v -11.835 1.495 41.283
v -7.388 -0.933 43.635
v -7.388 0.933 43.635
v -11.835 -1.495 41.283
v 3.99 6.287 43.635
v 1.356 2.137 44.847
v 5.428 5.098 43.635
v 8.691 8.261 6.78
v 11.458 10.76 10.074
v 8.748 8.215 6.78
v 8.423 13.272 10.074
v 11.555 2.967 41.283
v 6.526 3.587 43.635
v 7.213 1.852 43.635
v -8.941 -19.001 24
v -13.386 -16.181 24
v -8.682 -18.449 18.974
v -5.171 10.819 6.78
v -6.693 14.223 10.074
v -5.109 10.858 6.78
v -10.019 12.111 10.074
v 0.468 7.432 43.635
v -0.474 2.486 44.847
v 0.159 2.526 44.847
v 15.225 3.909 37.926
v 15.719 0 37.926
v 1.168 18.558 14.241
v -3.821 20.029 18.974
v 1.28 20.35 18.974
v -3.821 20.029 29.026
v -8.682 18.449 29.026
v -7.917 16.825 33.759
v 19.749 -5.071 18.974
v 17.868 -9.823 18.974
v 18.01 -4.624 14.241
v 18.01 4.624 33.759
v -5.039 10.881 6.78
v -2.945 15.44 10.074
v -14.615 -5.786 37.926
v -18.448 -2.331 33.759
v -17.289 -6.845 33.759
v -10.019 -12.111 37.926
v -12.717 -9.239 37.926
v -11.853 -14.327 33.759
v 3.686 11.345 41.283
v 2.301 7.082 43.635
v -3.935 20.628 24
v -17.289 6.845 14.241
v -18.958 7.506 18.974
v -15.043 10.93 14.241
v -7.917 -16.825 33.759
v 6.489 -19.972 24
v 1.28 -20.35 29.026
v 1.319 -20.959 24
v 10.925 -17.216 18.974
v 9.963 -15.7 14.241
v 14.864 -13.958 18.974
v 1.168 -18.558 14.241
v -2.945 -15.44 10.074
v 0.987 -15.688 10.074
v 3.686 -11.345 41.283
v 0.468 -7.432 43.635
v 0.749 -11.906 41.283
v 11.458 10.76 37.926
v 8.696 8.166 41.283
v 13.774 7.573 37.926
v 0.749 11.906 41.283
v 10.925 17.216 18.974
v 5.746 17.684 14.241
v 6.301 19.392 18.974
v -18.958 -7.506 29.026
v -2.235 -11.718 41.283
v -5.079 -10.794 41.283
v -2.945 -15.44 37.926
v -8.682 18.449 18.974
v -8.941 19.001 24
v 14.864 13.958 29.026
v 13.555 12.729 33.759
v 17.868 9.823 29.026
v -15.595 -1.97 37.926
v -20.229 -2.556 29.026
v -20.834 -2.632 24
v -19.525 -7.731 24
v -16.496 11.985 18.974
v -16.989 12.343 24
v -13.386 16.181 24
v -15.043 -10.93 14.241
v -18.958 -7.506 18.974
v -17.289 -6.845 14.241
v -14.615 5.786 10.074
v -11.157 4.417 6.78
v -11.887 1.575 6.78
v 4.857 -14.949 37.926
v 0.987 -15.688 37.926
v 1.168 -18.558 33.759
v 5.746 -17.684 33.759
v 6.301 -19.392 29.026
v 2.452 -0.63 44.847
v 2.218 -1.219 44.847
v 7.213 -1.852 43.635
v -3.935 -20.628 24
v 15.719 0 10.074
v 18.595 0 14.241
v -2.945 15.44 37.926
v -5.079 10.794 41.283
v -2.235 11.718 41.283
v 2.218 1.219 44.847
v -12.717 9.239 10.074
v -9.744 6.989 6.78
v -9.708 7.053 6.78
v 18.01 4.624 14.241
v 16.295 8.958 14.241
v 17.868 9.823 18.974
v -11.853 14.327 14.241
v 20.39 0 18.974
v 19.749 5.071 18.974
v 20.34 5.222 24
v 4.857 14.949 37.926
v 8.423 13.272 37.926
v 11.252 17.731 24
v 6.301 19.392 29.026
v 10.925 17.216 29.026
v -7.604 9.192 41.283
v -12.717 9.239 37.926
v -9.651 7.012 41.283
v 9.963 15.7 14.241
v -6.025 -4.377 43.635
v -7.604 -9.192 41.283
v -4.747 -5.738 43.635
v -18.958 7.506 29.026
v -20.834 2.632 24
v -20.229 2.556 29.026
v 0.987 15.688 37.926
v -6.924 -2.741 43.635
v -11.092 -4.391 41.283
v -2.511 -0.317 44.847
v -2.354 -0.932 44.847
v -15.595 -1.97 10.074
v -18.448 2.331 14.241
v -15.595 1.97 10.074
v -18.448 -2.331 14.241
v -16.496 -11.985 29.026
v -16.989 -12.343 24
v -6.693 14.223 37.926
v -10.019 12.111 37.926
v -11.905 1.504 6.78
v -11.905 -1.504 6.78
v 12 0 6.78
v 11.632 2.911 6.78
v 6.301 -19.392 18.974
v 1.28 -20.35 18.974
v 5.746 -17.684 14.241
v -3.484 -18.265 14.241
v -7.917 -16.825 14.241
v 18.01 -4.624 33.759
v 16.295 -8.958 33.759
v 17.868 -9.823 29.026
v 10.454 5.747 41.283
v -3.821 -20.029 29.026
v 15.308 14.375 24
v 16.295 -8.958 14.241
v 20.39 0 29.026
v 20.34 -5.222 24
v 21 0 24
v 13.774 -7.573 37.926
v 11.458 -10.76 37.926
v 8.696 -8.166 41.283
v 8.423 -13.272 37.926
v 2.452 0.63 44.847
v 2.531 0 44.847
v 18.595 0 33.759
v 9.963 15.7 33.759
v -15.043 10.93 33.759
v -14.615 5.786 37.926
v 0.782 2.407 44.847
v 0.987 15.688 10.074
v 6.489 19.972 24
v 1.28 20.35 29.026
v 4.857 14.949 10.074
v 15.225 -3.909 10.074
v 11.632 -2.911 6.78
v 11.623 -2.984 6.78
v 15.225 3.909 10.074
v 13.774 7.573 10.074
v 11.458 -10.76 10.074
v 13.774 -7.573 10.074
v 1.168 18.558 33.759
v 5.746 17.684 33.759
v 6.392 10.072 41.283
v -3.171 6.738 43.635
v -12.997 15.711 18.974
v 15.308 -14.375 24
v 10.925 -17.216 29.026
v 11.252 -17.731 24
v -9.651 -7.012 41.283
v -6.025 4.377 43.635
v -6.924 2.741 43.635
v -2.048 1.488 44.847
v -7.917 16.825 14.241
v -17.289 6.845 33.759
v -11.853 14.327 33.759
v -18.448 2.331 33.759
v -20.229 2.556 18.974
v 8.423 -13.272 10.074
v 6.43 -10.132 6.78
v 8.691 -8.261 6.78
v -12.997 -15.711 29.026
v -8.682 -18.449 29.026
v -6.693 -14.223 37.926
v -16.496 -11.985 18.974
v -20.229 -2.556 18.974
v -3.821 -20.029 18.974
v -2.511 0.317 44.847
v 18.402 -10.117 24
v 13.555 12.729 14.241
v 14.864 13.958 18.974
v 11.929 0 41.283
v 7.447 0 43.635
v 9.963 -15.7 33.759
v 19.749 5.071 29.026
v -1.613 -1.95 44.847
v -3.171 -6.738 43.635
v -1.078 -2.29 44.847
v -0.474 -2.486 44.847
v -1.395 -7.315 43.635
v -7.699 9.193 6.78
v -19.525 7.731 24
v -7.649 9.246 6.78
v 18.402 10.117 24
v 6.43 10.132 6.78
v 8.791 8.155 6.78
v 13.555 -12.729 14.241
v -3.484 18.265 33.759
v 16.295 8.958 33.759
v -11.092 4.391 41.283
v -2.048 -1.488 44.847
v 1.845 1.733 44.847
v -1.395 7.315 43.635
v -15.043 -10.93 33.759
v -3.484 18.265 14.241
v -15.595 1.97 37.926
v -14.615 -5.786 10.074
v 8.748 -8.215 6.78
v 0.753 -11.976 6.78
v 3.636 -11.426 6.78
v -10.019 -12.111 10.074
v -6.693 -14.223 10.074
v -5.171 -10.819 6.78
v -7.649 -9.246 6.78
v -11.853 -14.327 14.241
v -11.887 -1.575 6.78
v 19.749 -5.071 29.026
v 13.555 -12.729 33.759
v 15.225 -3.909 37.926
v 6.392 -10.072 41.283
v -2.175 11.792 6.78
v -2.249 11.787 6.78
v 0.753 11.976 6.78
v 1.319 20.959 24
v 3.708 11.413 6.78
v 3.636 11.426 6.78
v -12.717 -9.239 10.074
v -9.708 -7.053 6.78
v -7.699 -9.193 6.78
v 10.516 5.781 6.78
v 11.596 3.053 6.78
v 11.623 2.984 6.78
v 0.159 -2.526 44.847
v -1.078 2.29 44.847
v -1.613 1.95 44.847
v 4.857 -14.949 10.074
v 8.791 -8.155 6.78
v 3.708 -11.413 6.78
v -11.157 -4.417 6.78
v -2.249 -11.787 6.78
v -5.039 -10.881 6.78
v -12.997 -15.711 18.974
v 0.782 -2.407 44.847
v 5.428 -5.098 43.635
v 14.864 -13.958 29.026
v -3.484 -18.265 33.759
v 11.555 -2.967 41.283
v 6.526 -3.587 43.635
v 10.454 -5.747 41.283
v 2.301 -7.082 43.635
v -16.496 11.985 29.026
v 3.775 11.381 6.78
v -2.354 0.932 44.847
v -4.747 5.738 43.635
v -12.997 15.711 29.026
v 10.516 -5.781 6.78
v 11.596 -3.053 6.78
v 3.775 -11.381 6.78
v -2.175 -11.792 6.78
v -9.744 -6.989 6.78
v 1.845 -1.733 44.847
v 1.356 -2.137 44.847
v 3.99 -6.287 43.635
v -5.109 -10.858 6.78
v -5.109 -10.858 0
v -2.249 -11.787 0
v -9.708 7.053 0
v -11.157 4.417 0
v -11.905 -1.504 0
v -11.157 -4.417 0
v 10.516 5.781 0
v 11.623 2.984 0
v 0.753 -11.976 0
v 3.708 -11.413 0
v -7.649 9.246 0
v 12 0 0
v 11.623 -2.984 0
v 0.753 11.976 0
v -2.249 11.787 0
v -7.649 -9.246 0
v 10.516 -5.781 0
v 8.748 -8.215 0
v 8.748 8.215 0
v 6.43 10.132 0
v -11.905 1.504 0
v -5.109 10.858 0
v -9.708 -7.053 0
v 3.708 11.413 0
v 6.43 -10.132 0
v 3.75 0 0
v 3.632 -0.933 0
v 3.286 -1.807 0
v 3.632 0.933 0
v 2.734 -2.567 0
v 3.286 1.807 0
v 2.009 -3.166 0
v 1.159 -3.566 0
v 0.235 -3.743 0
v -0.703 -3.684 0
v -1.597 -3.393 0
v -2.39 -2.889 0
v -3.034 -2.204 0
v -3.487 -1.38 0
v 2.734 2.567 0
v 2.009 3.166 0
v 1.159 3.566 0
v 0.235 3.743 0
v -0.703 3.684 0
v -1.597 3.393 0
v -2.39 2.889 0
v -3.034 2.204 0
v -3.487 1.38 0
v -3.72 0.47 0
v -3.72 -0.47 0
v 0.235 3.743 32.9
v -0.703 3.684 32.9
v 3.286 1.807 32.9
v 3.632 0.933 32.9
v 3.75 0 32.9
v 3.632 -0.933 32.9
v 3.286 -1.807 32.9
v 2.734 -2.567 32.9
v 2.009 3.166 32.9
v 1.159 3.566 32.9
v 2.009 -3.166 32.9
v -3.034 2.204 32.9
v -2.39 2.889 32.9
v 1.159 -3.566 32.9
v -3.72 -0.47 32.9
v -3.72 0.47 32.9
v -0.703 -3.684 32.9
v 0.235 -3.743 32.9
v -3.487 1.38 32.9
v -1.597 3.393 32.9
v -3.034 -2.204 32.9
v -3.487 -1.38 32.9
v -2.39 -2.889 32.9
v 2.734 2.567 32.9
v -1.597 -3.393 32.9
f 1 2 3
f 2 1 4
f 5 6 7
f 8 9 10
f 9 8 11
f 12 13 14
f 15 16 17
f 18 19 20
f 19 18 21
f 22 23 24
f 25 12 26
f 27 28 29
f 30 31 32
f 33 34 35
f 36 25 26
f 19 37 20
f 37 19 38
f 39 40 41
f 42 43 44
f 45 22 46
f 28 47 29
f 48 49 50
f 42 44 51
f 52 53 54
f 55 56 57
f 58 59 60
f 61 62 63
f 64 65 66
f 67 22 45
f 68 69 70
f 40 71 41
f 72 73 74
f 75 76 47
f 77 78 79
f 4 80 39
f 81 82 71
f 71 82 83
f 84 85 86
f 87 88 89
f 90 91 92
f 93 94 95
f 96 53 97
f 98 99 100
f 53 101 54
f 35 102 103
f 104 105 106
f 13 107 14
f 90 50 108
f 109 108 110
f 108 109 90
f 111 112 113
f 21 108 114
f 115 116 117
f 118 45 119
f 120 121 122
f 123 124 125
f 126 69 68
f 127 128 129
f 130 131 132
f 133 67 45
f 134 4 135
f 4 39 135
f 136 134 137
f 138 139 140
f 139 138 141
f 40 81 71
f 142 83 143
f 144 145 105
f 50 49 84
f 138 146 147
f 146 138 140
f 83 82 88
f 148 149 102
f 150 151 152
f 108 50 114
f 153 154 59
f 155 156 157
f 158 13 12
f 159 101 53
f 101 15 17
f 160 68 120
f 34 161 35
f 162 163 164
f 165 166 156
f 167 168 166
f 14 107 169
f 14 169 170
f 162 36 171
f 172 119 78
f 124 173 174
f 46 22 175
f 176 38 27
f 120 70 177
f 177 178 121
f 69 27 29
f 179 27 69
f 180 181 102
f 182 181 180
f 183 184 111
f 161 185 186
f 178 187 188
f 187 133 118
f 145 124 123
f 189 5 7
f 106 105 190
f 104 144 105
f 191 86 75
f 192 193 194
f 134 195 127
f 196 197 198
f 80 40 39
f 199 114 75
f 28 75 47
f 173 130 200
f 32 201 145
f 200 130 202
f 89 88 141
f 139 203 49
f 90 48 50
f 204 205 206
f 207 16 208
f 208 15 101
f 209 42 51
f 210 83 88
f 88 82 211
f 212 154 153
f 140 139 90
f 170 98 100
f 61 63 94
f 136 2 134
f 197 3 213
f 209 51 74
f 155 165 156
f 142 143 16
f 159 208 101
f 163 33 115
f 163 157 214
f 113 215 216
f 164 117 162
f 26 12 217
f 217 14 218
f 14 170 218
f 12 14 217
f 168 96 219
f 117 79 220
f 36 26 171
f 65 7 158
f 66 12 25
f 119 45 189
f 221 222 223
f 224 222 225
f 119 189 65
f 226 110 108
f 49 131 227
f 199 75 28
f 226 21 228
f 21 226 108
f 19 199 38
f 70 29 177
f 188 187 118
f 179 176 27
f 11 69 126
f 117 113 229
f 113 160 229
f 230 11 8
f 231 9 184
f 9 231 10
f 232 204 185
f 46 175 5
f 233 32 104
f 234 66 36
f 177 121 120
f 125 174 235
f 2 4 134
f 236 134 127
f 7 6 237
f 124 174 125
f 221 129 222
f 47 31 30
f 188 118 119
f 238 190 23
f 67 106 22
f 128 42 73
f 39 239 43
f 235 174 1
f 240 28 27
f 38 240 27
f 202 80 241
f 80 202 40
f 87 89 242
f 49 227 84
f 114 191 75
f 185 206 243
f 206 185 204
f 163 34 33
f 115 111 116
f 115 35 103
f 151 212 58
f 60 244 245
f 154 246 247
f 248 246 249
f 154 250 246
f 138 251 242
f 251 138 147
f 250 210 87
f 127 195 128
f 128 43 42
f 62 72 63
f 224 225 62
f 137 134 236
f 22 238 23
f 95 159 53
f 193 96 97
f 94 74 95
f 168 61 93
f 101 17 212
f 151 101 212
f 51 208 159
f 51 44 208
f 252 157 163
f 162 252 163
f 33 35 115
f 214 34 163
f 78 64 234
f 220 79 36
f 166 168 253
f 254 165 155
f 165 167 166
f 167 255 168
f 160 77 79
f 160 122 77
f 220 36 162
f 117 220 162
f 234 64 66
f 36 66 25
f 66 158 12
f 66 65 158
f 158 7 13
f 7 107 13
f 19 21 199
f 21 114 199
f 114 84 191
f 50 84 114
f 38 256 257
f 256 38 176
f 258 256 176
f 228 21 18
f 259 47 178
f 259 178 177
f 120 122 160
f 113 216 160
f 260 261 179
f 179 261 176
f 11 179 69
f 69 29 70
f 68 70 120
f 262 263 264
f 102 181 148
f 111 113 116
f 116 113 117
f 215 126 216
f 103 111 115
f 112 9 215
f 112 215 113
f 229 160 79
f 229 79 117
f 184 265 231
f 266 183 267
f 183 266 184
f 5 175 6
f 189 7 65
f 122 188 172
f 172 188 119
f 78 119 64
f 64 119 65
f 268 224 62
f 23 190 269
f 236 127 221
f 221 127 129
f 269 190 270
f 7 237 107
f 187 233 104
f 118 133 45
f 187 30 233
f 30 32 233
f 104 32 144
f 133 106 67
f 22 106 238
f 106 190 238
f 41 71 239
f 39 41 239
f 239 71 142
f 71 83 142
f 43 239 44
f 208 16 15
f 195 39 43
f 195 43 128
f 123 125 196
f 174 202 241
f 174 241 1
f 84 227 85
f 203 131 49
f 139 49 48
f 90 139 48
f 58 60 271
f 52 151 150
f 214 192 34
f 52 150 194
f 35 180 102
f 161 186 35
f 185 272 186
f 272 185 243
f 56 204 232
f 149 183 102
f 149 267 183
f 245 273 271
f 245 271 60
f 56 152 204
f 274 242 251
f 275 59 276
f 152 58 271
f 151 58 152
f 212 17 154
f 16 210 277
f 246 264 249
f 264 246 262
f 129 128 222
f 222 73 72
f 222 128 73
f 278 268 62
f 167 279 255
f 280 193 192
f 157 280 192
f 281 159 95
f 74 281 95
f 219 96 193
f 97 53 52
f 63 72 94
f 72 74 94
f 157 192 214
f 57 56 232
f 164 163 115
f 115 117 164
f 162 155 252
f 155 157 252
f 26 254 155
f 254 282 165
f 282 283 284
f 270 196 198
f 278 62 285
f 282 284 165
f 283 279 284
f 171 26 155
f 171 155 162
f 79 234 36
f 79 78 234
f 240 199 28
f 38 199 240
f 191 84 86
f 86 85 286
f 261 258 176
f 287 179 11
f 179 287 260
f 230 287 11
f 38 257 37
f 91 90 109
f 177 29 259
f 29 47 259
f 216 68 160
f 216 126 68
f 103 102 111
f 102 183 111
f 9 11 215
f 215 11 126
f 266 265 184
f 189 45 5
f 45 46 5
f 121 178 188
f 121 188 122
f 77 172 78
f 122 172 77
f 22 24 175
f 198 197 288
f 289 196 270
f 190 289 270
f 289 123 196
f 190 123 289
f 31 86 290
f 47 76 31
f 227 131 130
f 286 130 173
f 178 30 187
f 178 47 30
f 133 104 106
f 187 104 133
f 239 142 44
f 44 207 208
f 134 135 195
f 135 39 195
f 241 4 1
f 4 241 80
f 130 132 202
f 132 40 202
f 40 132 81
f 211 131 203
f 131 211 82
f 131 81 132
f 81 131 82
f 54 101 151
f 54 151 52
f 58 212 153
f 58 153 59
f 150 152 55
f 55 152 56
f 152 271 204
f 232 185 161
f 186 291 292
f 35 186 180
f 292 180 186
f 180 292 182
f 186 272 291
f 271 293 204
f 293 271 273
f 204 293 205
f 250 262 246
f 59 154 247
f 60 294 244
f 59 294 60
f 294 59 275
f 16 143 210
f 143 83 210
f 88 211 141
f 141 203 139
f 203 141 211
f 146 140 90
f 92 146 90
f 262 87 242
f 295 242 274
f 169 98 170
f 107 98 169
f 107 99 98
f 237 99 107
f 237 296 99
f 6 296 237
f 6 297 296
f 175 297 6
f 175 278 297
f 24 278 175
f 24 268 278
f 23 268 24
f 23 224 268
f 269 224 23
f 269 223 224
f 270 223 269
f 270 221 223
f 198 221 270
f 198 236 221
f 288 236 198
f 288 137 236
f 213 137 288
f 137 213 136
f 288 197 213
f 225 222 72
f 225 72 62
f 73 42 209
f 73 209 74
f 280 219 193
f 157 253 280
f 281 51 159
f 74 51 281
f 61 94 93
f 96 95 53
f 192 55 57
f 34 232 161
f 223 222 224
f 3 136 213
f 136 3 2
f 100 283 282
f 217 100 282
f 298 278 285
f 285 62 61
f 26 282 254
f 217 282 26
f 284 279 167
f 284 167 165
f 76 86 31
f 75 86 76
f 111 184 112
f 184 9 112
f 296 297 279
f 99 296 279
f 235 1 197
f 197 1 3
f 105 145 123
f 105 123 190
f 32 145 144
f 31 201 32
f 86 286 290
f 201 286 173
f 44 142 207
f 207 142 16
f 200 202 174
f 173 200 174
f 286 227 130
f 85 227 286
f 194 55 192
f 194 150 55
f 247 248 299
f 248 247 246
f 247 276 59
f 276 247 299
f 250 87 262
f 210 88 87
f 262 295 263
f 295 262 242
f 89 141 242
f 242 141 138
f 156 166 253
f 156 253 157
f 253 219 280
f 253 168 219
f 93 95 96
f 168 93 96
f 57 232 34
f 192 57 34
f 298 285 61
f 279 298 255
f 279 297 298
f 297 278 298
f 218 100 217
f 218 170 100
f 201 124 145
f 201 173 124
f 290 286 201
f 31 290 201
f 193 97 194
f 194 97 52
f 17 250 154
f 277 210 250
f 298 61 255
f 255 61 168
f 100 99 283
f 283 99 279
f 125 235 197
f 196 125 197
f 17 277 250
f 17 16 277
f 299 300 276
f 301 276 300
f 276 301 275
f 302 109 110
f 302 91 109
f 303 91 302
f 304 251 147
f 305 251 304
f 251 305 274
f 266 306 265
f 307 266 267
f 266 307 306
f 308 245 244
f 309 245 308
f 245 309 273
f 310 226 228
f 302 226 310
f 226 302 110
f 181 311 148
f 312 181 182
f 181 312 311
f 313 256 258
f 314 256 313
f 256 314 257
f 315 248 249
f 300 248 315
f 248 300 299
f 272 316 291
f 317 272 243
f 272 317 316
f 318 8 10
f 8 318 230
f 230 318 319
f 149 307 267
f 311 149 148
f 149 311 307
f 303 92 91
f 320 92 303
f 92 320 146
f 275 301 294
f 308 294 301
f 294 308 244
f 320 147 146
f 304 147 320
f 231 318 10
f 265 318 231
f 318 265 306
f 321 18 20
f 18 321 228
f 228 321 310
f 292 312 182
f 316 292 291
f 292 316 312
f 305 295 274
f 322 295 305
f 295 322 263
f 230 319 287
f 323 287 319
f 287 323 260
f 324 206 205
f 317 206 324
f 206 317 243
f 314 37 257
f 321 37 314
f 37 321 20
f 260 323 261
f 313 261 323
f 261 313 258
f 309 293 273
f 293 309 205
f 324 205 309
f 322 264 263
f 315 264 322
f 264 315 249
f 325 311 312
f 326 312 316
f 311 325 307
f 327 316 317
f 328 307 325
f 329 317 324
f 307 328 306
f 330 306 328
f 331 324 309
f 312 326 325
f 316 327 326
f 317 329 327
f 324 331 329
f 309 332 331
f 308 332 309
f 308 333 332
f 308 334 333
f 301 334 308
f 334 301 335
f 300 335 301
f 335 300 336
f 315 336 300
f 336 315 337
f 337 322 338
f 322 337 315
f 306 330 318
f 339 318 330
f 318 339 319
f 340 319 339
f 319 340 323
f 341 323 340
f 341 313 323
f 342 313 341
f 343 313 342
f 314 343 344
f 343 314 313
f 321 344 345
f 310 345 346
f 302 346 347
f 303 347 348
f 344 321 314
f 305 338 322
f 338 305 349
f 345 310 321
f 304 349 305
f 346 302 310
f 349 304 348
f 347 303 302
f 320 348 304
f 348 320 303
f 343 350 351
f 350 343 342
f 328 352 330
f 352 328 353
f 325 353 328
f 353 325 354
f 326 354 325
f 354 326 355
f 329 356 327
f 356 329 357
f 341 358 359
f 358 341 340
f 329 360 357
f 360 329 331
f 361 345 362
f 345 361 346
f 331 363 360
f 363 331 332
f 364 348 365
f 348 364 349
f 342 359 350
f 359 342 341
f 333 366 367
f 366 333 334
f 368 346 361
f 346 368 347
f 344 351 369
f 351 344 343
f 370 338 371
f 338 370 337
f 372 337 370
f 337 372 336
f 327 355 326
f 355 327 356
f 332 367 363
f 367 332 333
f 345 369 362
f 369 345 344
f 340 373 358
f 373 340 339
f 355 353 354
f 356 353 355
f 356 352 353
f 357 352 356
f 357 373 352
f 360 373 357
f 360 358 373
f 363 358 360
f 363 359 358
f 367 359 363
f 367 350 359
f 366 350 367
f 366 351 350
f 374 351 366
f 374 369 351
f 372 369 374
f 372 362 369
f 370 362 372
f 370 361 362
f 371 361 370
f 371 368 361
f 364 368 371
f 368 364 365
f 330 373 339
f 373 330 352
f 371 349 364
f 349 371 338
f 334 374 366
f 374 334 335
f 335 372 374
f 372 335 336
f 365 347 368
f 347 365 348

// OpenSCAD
//General Knob
//Hole is threadless, designed for later tapping using an appropriate sized thread tap.
//Threads can also be created in 3d and "cut out" in place of the screw hole and then printed directly into the knob if one so desires.
//
//
shaftdia=24; //diameter of the shaft
shafth=12; //height of the shaft
balldia=42; //diameter of the main ball
$fn=25; //how smooth the ball and shaft are. Bigger number = smoother appearance. Too large and it will take ages to compile.
holedia=7.5; //how big the hole in the shaft is. This should be adjusted to either suit a rod or other object to be inserted and glued, resized to suit tapping, or replaced with an imported or generated thread pattern for direct thread printing.
stl="example.stl"; //import an STL file of a screw or bolt thread pattern to be printed directly into the knob.

//Note: Path to STL must be in this format "C:\\folder here\\another folder\\stlfile.stl" if not in the same directory as the .scad file. You must use double backslash.

//Knobby stuff
module knob_shaft()
{
	union()
		{
			translate([0,0,shafth*2])sphere(d=balldia);
			cylinder(d=shaftdia,h=shafth);
		}
}

//Hole for screwing
difference()
	{
		knob_shaft();
		translate([0,0,-0.1])cylinder(d=holedia,h=balldia/2+shafth); //comment out this line if you wish to import a thread mesh below.
		//translate([0,0,0])import (stl); //uncomment this line to use an imported thread mesh. may need to be translated depending on how long it is or the orientation it was in when exported.
	}
